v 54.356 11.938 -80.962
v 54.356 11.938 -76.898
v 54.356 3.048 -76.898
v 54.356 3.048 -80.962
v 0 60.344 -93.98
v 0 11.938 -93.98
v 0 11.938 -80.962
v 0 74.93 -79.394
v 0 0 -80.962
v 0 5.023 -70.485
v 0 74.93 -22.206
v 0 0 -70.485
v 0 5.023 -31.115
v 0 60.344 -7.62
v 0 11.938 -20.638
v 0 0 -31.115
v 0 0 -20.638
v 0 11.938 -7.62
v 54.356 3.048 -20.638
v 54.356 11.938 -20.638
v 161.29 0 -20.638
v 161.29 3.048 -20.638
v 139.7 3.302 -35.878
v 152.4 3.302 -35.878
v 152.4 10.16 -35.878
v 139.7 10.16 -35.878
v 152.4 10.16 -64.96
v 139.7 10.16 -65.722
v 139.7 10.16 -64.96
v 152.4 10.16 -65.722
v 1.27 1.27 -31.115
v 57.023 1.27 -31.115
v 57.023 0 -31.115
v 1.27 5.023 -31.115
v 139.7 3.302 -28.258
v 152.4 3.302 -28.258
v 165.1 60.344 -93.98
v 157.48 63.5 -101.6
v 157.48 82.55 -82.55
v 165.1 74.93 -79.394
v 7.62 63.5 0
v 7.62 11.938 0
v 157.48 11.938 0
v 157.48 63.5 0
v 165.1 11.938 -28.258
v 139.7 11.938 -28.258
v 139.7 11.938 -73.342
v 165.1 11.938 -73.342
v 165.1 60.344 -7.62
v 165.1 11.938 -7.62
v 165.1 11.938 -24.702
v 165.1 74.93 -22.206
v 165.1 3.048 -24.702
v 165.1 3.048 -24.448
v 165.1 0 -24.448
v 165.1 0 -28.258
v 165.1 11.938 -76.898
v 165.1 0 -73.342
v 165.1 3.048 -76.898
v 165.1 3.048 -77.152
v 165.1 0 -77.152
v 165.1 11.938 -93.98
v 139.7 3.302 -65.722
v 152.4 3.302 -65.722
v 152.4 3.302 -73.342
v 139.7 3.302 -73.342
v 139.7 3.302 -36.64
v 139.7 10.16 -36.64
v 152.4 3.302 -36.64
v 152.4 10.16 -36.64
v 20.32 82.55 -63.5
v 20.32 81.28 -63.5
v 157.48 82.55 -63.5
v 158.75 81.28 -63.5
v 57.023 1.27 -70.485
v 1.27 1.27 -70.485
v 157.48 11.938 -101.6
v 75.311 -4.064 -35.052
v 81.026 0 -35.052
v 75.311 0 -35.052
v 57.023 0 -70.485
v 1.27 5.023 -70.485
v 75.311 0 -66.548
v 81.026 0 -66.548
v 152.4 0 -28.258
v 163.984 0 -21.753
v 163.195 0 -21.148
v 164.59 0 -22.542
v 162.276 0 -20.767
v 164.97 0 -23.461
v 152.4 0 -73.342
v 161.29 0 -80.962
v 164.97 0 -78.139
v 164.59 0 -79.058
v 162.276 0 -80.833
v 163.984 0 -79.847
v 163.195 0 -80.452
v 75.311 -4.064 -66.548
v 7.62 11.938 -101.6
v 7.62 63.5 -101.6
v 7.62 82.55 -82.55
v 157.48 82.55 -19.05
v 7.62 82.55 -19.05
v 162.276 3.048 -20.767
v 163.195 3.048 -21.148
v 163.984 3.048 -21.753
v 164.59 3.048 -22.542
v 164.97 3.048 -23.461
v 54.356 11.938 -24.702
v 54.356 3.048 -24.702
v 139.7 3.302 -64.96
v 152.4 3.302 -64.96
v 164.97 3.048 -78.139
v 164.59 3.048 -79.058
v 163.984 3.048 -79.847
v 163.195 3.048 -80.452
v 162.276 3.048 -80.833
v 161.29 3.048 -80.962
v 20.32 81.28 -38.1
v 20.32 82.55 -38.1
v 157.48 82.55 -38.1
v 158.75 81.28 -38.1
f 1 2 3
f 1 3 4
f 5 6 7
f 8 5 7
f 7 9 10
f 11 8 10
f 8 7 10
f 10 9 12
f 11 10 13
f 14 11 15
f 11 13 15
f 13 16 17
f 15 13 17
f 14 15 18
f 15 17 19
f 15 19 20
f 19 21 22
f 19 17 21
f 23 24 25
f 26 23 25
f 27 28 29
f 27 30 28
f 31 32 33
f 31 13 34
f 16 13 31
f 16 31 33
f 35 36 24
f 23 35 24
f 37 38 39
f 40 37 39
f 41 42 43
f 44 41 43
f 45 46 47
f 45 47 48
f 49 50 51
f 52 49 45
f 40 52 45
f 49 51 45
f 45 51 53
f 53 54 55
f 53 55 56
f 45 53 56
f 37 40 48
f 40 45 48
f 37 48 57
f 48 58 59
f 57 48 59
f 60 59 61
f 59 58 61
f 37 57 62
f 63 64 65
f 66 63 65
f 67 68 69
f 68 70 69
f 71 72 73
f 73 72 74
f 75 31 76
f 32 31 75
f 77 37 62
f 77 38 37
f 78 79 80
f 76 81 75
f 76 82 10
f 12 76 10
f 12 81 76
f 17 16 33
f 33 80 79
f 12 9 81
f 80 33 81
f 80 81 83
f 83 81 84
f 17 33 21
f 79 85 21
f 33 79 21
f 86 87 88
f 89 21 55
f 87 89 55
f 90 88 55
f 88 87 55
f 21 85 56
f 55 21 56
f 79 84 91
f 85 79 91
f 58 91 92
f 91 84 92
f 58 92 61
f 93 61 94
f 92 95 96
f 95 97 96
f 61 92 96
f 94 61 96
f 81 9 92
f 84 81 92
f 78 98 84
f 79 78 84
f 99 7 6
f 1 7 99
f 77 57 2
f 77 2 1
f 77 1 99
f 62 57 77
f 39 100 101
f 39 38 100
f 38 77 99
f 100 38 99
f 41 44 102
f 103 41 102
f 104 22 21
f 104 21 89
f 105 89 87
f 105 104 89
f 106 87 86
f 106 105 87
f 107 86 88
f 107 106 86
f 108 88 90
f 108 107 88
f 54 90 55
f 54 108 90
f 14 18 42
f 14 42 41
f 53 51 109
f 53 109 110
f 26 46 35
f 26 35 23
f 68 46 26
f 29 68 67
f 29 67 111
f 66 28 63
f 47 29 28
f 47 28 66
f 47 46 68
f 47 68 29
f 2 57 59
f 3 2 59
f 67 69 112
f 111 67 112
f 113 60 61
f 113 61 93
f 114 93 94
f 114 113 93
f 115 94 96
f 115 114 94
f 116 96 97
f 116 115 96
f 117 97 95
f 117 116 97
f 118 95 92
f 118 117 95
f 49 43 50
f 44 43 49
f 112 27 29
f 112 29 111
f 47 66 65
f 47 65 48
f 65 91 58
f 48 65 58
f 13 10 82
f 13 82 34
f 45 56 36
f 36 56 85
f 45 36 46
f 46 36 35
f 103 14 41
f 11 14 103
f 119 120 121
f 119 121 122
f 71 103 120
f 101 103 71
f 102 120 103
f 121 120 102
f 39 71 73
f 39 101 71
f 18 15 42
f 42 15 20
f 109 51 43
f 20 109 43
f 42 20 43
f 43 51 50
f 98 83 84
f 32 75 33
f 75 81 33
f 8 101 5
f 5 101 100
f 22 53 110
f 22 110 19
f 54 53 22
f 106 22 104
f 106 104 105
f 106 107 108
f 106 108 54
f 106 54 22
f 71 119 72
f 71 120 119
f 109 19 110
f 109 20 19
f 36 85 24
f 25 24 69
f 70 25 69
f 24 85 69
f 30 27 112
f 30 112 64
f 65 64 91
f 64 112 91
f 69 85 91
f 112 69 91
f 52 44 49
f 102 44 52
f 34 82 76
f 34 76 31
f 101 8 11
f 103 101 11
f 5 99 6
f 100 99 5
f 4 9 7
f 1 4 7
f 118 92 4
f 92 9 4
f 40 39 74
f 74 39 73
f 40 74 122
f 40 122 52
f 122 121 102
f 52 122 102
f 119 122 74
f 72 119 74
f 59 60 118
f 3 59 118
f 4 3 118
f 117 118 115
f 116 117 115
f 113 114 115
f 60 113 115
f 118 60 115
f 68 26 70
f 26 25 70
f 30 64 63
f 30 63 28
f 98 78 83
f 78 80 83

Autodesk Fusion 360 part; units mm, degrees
sketch "Sketch1" plane through (0, 0, 0) normal (0, 1, 0) x (1, 0, 0)
  line L0 (0, 0) -> (165.1, 0)
  line L1 (165.1, 0) -> (165.1, 101.6)
  line L2 (165.1, 101.6) -> (0, 101.6)
  line L3 (0, 101.6) -> (0, 0)
  dimension "d1" = 165.1
  dimension "d2" = 101.6
extrude "Extrude1" add sketch "Sketch1" along normal blind 82.55
sketch "Sketch2" plane through (165.1, 0, 0) normal (1, 0, 0) x (0, 0, -1)
  line L0 (0, 0) -> (101.6, 0)
  line L1 (101.6, 0) -> (101.6, 82.55)
  line L2 (101.6, 82.55) -> (0, 82.55)
  line L3 (0, 82.55) -> (0, 0)
  line L4 (0, 82.55) -> (0, 63.5)
  line L5 (0, 63.5) -> (19.05, 82.55)
  line L6 (0, 82.55) -> (19.05, 82.55)
  line L7 (101.6, 82.55) -> (101.6, 63.5)
  line L8 (101.6, 63.5) -> (82.55, 82.55)
  line L9 (82.55, 82.55) -> (101.6, 82.55)
  line L10 (0, 0) -> (20.6375, 0)
  line L11 (20.6375, 0) -> (80.9625, 0)
  line L12 (80.9625, 0) -> (101.6, 0)
  line L13 (20.6375, 0) -> (20.6375, 11.938)
  line L14 (20.6375, 11.938) -> (0, 11.938)
  line L15 (0, 11.938) -> (0, 0)
  line L16 (80.9625, 0) -> (80.9625, 11.938)
  line L17 (80.9625, 11.938) -> (101.6, 11.938)
  line L18 (101.6, 0) -> (101.6, 11.938)
  line L19 (80.9625, 11.938) -> (80.9625, 0)
  dimension "d5" = 45
  dimension "d6" = 45
  dimension "d7" = 20.6375
  dimension "d8" = 60.325
  dimension "d9" = 11.938
extrude "Extrude2" cut sketch "Sketch2" against normal blind 254 contours L0 L3 L10 L13 L14 L15 | L0 L1 L12 L16 L17 L18 L19 | L2 L3 L4 L5 L6 | L1 L2 L7 L8 L9
sketch "Sketch3" plane through (0, 0, 0) normal (0, -1, 0) x (1, 0, 0)
  line L0 (165.1, -20.6375) -> (0, -20.6375)
  line L1 (0, -20.6375) -> (0, -80.9625)
  line L2 (0, -80.9625) -> (165.1, -80.9625)
  line L3 (165.1, -80.9625) -> (165.1, -20.6375)
  line L4 (165.1, -20.6375) -> (165.1, -28.2575)
  line L5 (165.1, -80.9625) -> (165.1, -73.3425)
  line L6 (165.1, -28.2575) -> (152.4, -28.2575)
  line L7 (152.4, -28.2575) -> (152.4, -73.3425)
  line L8 (152.4, -73.3425) -> (165.1, -73.3425)
  line L9 (165.1, -73.3425) -> (165.1, -28.2575)
  line L10 (152.4, -50.8) -> (81.026, -50.8)
  line L11 (81.026, -50.8) -> (81.026, -35.052)
  line L12 (81.026, -50.8) -> (81.026, -66.548)
  line L13 (81.026, -35.052) -> (75.311, -35.052)
  line L14 (75.311, -35.052) -> (75.311, -66.548)
  line L15 (75.311, -66.548) -> (81.026, -66.548)
  line L16 (81.026, -66.548) -> (81.026, -35.052)
  line L17 (75.311, -50.8) -> (57.023, -50.8)
  line L18 (57.023, -50.8) -> (57.023, -31.115)
  line L19 (57.023, -50.8) -> (57.023, -70.485)
  line L20 (57.023, -70.485) -> (0, -70.485)
  line L21 (57.023, -31.115) -> (0, -31.115)
  line L22 (0, -31.115) -> (0, -70.485)
  dimension "d12" = 7.62
  dimension "d13" = 7.62
  dimension "d14" = 12.7
  dimension "d15" = 71.374
  dimension "d16" = 15.748
  dimension "d17" = 15.748
  dimension "d18" = 5.715
  dimension "d19" = 31.496
  dimension "d20" = 18.288
  dimension "d21" = 19.685
  dimension "d22" = 19.685
extrude "Extrude3" cut sketch "Sketch3" against normal up to surface (11.938 mm away) contours L3 L6 L7 L8 L9
extrude "Extrude4" add sketch "Sketch3" along normal blind 4.064 contours L11 L12 L13 L14 L15 L16
sketch "Sketch4" plane through (0, 0, -66.548) normal (0, 0, -1) x (-1, 0, 0)
  line L0 (-75.311, 0) -> (-81.026, 0)
  line L1 (-81.026, 0) -> (-81.026, -4.064)
  line L2 (-81.026, -4.064) -> (-75.311, -4.064)
  line L3 (-75.311, -4.064) -> (-75.311, 0)
  line L4 (-75.311, -4.064) -> (-81.026, 0)
  line L5 (-81.026, 0) -> (-81.026, -4.064)
  line L6 (-75.311, -4.064) -> (-81.026, -4.064)
extrude "Extrude5" cut sketch "Sketch4" against normal blind 38.1 contours L1 L2 L4 L5 L6
extrude "Extrude6" cut sketch "Sketch3" against normal blind 1.27 contours L1 L18 L19 L20 L21 L22
sketch "Sketch5" plane through (0, 0, 0) normal (-1, 0, 0) x (0, 0, 1)
  line L0 (-70.485, 0) -> (-70.485, 1.27)
  line L1 (-70.485, 1.27) -> (-31.115, 1.27)
  line L2 (-31.115, 1.27) -> (-31.115, 0)
  line L3 (-31.115, 0) -> (-20.6375, 0)
  line L4 (-20.6375, 0) -> (-20.6375, 11.938)
  line L5 (-20.6375, 11.938) -> (0, 11.938)
  line L6 (0, 11.938) -> (0, 63.5)
  line L7 (0, 63.5) -> (-19.05, 82.55)
  line L8 (-19.05, 82.55) -> (-82.55, 82.55)
  line L9 (-82.55, 82.55) -> (-101.6, 63.5)
  line L10 (-101.6, 63.5) -> (-101.6, 11.938)
  line L11 (-101.6, 11.938) -> (-80.9625, 11.938)
  line L12 (-80.9625, 11.938) -> (-80.9625, 0)
  line L13 (-80.9625, 0) -> (-70.485, 0)
  line L14 (-31.115, 1.27) -> (-70.485, 1.27)
  line L15 (-70.485, 1.27) -> (-70.485, 5.0232)
  line L16 (-70.485, 5.0232) -> (-31.115, 5.0232)
  line L17 (-31.115, 5.0232) -> (-31.115, 1.27)
extrude "Extrude7" cut sketch "Sketch5" against normal blind 1.27 contours L1 L14 L15 L16 L17
sketch "Sketch6" plane through (165.1, 0, 0) normal (1, 0, 0) x (0, 0, -1)
  line L0 (73.3425, 11.938) -> (73.3425, 0)
  line L1 (73.3425, 0) -> (80.9625, 0)
  line L2 (80.9625, 0) -> (80.9625, 11.938)
  line L3 (80.9625, 11.938) -> (101.6, 11.938)
  line L4 (101.6, 11.938) -> (101.6, 63.5)
  line L5 (101.6, 63.5) -> (82.55, 82.55)
  line L6 (82.55, 82.55) -> (19.05, 82.55)
  line L7 (19.05, 82.55) -> (0, 63.5)
  line L8 (0, 63.5) -> (0, 11.938)
  line L9 (0, 11.938) -> (20.6375, 11.938)
  line L10 (20.6375, 11.938) -> (20.6375, 0)
  line L11 (20.6375, 0) -> (28.2575, 0)
  line L12 (28.2575, 0) -> (28.2575, 11.938)
  line L13 (28.2575, 11.938) -> (73.3425, 11.938)
  line L14 (20.6375, 11.938) -> (24.7015, 11.938)
  line L15 (24.7015, 11.938) -> (24.7015, 3.048)
  line L16 (24.7015, 3.048) -> (20.6375, 3.048)
  line L17 (20.6375, 3.048) -> (20.6375, 11.938)
  line L18 (80.9625, 11.938) -> (76.8985, 11.938)
  line L19 (76.8985, 11.938) -> (76.8985, 3.048)
  line L20 (76.8985, 3.048) -> (80.9625, 3.048)
  line L21 (80.9625, 3.048) -> (80.9625, 11.938)
  dimension "d33" = 4.064
  dimension "d34" = 8.89
  dimension "d35" = 4.064
  dimension "d36" = 8.89
extrude "Extrude8" cut sketch "Sketch6" against normal blind 110.744 contours L2 L18 L19 L20 L21
extrude "Extrude9" cut sketch "Sketch6" against normal blind 110.744 contours L10 L14 L15 L16 L17
fillet "Fillet1" radius 3.81 2 edges at (165.1, 1.524, -80.9625) (165.1, 1.524, -20.6375)
sketch "Sketch7" plane through (152.4, 0, 0) normal (1, 0, 0) x (0, 0, -1)
  line L0 (73.3425, 11.938) -> (28.2575, 11.938)
  line L1 (28.2575, 11.938) -> (28.2575, 0)
  line L2 (28.2575, 0) -> (73.3425, 0)
  line L3 (73.3425, 0) -> (73.3425, 11.938)
  line L4 (73.3425, 11.938) -> (28.2575, 11.938)
  line L5 (28.2575, 11.938) -> (28.2575, 3.302)
  line L6 (28.2575, 3.302) -> (73.3425, 3.302)
  line L7 (73.3425, 3.302) -> (73.3425, 11.938)
  line L8 (73.3425, 3.302) -> (65.7225, 3.302)
  line L9 (65.7225, 3.302) -> (65.7225, 10.16)
  line L10 (65.7225, 10.16) -> (64.9605, 10.16)
  line L11 (64.9605, 10.16) -> (64.9605, 3.302)
  line L12 (64.9605, 3.302) -> (65.7225, 3.302)
  line L13 (28.2575, 3.302) -> (35.8775, 3.302)
  line L14 (35.8775, 3.302) -> (35.8775, 10.16)
  line L15 (35.8775, 10.16) -> (36.6395, 10.16)
  line L16 (36.6395, 10.16) -> (36.6395, 3.302)
  dimension "d43" = 8.636
  dimension "d44" = 7.62
  dimension "d45" = 0.762
  dimension "d46" = 7.62
  dimension "d47" = 6.858
  dimension "d48" = 0.762
extrude "Extrude10" cut sketch "Sketch7" against normal blind 12.7 contours L0 L1 L3 L4 L5 L6 L7 L8 L9 L10 L11 L13 L14 L15 L16
sketch "Sketch8" plane through (165.1, 0, 0) normal (1, 0, 0) x (0, 0, -1)
  line L0 (24.4475, 3.048) -> (24.4475, 0)
  line L1 (24.4475, 0) -> (28.2575, 0)
  line L2 (28.2575, 0) -> (28.2575, 11.938)
  line L3 (28.2575, 11.938) -> (73.3425, 11.938)
  line L4 (73.3425, 11.938) -> (73.3425, 0)
  line L5 (73.3425, 0) -> (77.1525, 0)
  line L6 (77.1525, 0) -> (77.1525, 3.048)
  line L7 (77.1525, 3.048) -> (76.8985, 3.048)
  line L8 (76.8985, 3.048) -> (76.8985, 11.938)
  line L9 (76.8985, 11.938) -> (101.6, 11.938)
  line L10 (101.6, 11.938) -> (101.6, 63.5)
  line L11 (101.6, 63.5) -> (82.55, 82.55)
  line L12 (82.55, 82.55) -> (19.05, 82.55)
  line L13 (19.05, 82.55) -> (0, 63.5)
  line L14 (0, 63.5) -> (0, 11.938)
  line L15 (0, 11.938) -> (24.7015, 11.938)
  line L16 (24.7015, 11.938) -> (24.7015, 3.048)
  line L17 (24.7015, 3.048) -> (24.4475, 3.048)
  line L18 (50.8, 82.55) -> (63.5, 82.55)
  line L19 (50.8, 82.55) -> (38.1, 82.55)
  line L20 (38.1, 82.55) -> (38.1, 81.28)
  line L21 (38.1, 81.28) -> (63.5, 81.28)
  line L22 (63.5, 81.28) -> (63.5, 82.55)
  dimension "d51" = 1.27
extrude "Extrude11" cut sketch "Sketch8" against normal blind 144.78 contours L12 L18 L19 L20 L21 L22
sketch "Sketch9" plane through (0, 81.28, 0) normal (0, 1, 0) x (-1, 0, 0)
  line L0 (-165.1, -38.1) -> (-165.1, -63.5)
  line L1 (-165.1, -63.5) -> (-20.32, -63.5)
  line L2 (-20.32, -63.5) -> (-20.32, -38.1)
  line L3 (-20.32, -38.1) -> (-165.1, -38.1)
chamfer "Chamfer2" distance 7.62 angle 45 6 edges at (165.1, 82.55, -73.025) (165.1, 73.025, -92.075) (165.1, 37.719, -101.6) (165.1, 82.55, -28.575) (165.1, 73.025, -9.525) (165.1, 37.719, 0)
chamfer "Chamfer3" distance 7.62 angle 45 5 edges at (0, 37.719, -101.6) (0, 73.025, -92.075) (0, 82.55, -50.8) (0, 73.025, -9.525) (0, 37.719, 0)
